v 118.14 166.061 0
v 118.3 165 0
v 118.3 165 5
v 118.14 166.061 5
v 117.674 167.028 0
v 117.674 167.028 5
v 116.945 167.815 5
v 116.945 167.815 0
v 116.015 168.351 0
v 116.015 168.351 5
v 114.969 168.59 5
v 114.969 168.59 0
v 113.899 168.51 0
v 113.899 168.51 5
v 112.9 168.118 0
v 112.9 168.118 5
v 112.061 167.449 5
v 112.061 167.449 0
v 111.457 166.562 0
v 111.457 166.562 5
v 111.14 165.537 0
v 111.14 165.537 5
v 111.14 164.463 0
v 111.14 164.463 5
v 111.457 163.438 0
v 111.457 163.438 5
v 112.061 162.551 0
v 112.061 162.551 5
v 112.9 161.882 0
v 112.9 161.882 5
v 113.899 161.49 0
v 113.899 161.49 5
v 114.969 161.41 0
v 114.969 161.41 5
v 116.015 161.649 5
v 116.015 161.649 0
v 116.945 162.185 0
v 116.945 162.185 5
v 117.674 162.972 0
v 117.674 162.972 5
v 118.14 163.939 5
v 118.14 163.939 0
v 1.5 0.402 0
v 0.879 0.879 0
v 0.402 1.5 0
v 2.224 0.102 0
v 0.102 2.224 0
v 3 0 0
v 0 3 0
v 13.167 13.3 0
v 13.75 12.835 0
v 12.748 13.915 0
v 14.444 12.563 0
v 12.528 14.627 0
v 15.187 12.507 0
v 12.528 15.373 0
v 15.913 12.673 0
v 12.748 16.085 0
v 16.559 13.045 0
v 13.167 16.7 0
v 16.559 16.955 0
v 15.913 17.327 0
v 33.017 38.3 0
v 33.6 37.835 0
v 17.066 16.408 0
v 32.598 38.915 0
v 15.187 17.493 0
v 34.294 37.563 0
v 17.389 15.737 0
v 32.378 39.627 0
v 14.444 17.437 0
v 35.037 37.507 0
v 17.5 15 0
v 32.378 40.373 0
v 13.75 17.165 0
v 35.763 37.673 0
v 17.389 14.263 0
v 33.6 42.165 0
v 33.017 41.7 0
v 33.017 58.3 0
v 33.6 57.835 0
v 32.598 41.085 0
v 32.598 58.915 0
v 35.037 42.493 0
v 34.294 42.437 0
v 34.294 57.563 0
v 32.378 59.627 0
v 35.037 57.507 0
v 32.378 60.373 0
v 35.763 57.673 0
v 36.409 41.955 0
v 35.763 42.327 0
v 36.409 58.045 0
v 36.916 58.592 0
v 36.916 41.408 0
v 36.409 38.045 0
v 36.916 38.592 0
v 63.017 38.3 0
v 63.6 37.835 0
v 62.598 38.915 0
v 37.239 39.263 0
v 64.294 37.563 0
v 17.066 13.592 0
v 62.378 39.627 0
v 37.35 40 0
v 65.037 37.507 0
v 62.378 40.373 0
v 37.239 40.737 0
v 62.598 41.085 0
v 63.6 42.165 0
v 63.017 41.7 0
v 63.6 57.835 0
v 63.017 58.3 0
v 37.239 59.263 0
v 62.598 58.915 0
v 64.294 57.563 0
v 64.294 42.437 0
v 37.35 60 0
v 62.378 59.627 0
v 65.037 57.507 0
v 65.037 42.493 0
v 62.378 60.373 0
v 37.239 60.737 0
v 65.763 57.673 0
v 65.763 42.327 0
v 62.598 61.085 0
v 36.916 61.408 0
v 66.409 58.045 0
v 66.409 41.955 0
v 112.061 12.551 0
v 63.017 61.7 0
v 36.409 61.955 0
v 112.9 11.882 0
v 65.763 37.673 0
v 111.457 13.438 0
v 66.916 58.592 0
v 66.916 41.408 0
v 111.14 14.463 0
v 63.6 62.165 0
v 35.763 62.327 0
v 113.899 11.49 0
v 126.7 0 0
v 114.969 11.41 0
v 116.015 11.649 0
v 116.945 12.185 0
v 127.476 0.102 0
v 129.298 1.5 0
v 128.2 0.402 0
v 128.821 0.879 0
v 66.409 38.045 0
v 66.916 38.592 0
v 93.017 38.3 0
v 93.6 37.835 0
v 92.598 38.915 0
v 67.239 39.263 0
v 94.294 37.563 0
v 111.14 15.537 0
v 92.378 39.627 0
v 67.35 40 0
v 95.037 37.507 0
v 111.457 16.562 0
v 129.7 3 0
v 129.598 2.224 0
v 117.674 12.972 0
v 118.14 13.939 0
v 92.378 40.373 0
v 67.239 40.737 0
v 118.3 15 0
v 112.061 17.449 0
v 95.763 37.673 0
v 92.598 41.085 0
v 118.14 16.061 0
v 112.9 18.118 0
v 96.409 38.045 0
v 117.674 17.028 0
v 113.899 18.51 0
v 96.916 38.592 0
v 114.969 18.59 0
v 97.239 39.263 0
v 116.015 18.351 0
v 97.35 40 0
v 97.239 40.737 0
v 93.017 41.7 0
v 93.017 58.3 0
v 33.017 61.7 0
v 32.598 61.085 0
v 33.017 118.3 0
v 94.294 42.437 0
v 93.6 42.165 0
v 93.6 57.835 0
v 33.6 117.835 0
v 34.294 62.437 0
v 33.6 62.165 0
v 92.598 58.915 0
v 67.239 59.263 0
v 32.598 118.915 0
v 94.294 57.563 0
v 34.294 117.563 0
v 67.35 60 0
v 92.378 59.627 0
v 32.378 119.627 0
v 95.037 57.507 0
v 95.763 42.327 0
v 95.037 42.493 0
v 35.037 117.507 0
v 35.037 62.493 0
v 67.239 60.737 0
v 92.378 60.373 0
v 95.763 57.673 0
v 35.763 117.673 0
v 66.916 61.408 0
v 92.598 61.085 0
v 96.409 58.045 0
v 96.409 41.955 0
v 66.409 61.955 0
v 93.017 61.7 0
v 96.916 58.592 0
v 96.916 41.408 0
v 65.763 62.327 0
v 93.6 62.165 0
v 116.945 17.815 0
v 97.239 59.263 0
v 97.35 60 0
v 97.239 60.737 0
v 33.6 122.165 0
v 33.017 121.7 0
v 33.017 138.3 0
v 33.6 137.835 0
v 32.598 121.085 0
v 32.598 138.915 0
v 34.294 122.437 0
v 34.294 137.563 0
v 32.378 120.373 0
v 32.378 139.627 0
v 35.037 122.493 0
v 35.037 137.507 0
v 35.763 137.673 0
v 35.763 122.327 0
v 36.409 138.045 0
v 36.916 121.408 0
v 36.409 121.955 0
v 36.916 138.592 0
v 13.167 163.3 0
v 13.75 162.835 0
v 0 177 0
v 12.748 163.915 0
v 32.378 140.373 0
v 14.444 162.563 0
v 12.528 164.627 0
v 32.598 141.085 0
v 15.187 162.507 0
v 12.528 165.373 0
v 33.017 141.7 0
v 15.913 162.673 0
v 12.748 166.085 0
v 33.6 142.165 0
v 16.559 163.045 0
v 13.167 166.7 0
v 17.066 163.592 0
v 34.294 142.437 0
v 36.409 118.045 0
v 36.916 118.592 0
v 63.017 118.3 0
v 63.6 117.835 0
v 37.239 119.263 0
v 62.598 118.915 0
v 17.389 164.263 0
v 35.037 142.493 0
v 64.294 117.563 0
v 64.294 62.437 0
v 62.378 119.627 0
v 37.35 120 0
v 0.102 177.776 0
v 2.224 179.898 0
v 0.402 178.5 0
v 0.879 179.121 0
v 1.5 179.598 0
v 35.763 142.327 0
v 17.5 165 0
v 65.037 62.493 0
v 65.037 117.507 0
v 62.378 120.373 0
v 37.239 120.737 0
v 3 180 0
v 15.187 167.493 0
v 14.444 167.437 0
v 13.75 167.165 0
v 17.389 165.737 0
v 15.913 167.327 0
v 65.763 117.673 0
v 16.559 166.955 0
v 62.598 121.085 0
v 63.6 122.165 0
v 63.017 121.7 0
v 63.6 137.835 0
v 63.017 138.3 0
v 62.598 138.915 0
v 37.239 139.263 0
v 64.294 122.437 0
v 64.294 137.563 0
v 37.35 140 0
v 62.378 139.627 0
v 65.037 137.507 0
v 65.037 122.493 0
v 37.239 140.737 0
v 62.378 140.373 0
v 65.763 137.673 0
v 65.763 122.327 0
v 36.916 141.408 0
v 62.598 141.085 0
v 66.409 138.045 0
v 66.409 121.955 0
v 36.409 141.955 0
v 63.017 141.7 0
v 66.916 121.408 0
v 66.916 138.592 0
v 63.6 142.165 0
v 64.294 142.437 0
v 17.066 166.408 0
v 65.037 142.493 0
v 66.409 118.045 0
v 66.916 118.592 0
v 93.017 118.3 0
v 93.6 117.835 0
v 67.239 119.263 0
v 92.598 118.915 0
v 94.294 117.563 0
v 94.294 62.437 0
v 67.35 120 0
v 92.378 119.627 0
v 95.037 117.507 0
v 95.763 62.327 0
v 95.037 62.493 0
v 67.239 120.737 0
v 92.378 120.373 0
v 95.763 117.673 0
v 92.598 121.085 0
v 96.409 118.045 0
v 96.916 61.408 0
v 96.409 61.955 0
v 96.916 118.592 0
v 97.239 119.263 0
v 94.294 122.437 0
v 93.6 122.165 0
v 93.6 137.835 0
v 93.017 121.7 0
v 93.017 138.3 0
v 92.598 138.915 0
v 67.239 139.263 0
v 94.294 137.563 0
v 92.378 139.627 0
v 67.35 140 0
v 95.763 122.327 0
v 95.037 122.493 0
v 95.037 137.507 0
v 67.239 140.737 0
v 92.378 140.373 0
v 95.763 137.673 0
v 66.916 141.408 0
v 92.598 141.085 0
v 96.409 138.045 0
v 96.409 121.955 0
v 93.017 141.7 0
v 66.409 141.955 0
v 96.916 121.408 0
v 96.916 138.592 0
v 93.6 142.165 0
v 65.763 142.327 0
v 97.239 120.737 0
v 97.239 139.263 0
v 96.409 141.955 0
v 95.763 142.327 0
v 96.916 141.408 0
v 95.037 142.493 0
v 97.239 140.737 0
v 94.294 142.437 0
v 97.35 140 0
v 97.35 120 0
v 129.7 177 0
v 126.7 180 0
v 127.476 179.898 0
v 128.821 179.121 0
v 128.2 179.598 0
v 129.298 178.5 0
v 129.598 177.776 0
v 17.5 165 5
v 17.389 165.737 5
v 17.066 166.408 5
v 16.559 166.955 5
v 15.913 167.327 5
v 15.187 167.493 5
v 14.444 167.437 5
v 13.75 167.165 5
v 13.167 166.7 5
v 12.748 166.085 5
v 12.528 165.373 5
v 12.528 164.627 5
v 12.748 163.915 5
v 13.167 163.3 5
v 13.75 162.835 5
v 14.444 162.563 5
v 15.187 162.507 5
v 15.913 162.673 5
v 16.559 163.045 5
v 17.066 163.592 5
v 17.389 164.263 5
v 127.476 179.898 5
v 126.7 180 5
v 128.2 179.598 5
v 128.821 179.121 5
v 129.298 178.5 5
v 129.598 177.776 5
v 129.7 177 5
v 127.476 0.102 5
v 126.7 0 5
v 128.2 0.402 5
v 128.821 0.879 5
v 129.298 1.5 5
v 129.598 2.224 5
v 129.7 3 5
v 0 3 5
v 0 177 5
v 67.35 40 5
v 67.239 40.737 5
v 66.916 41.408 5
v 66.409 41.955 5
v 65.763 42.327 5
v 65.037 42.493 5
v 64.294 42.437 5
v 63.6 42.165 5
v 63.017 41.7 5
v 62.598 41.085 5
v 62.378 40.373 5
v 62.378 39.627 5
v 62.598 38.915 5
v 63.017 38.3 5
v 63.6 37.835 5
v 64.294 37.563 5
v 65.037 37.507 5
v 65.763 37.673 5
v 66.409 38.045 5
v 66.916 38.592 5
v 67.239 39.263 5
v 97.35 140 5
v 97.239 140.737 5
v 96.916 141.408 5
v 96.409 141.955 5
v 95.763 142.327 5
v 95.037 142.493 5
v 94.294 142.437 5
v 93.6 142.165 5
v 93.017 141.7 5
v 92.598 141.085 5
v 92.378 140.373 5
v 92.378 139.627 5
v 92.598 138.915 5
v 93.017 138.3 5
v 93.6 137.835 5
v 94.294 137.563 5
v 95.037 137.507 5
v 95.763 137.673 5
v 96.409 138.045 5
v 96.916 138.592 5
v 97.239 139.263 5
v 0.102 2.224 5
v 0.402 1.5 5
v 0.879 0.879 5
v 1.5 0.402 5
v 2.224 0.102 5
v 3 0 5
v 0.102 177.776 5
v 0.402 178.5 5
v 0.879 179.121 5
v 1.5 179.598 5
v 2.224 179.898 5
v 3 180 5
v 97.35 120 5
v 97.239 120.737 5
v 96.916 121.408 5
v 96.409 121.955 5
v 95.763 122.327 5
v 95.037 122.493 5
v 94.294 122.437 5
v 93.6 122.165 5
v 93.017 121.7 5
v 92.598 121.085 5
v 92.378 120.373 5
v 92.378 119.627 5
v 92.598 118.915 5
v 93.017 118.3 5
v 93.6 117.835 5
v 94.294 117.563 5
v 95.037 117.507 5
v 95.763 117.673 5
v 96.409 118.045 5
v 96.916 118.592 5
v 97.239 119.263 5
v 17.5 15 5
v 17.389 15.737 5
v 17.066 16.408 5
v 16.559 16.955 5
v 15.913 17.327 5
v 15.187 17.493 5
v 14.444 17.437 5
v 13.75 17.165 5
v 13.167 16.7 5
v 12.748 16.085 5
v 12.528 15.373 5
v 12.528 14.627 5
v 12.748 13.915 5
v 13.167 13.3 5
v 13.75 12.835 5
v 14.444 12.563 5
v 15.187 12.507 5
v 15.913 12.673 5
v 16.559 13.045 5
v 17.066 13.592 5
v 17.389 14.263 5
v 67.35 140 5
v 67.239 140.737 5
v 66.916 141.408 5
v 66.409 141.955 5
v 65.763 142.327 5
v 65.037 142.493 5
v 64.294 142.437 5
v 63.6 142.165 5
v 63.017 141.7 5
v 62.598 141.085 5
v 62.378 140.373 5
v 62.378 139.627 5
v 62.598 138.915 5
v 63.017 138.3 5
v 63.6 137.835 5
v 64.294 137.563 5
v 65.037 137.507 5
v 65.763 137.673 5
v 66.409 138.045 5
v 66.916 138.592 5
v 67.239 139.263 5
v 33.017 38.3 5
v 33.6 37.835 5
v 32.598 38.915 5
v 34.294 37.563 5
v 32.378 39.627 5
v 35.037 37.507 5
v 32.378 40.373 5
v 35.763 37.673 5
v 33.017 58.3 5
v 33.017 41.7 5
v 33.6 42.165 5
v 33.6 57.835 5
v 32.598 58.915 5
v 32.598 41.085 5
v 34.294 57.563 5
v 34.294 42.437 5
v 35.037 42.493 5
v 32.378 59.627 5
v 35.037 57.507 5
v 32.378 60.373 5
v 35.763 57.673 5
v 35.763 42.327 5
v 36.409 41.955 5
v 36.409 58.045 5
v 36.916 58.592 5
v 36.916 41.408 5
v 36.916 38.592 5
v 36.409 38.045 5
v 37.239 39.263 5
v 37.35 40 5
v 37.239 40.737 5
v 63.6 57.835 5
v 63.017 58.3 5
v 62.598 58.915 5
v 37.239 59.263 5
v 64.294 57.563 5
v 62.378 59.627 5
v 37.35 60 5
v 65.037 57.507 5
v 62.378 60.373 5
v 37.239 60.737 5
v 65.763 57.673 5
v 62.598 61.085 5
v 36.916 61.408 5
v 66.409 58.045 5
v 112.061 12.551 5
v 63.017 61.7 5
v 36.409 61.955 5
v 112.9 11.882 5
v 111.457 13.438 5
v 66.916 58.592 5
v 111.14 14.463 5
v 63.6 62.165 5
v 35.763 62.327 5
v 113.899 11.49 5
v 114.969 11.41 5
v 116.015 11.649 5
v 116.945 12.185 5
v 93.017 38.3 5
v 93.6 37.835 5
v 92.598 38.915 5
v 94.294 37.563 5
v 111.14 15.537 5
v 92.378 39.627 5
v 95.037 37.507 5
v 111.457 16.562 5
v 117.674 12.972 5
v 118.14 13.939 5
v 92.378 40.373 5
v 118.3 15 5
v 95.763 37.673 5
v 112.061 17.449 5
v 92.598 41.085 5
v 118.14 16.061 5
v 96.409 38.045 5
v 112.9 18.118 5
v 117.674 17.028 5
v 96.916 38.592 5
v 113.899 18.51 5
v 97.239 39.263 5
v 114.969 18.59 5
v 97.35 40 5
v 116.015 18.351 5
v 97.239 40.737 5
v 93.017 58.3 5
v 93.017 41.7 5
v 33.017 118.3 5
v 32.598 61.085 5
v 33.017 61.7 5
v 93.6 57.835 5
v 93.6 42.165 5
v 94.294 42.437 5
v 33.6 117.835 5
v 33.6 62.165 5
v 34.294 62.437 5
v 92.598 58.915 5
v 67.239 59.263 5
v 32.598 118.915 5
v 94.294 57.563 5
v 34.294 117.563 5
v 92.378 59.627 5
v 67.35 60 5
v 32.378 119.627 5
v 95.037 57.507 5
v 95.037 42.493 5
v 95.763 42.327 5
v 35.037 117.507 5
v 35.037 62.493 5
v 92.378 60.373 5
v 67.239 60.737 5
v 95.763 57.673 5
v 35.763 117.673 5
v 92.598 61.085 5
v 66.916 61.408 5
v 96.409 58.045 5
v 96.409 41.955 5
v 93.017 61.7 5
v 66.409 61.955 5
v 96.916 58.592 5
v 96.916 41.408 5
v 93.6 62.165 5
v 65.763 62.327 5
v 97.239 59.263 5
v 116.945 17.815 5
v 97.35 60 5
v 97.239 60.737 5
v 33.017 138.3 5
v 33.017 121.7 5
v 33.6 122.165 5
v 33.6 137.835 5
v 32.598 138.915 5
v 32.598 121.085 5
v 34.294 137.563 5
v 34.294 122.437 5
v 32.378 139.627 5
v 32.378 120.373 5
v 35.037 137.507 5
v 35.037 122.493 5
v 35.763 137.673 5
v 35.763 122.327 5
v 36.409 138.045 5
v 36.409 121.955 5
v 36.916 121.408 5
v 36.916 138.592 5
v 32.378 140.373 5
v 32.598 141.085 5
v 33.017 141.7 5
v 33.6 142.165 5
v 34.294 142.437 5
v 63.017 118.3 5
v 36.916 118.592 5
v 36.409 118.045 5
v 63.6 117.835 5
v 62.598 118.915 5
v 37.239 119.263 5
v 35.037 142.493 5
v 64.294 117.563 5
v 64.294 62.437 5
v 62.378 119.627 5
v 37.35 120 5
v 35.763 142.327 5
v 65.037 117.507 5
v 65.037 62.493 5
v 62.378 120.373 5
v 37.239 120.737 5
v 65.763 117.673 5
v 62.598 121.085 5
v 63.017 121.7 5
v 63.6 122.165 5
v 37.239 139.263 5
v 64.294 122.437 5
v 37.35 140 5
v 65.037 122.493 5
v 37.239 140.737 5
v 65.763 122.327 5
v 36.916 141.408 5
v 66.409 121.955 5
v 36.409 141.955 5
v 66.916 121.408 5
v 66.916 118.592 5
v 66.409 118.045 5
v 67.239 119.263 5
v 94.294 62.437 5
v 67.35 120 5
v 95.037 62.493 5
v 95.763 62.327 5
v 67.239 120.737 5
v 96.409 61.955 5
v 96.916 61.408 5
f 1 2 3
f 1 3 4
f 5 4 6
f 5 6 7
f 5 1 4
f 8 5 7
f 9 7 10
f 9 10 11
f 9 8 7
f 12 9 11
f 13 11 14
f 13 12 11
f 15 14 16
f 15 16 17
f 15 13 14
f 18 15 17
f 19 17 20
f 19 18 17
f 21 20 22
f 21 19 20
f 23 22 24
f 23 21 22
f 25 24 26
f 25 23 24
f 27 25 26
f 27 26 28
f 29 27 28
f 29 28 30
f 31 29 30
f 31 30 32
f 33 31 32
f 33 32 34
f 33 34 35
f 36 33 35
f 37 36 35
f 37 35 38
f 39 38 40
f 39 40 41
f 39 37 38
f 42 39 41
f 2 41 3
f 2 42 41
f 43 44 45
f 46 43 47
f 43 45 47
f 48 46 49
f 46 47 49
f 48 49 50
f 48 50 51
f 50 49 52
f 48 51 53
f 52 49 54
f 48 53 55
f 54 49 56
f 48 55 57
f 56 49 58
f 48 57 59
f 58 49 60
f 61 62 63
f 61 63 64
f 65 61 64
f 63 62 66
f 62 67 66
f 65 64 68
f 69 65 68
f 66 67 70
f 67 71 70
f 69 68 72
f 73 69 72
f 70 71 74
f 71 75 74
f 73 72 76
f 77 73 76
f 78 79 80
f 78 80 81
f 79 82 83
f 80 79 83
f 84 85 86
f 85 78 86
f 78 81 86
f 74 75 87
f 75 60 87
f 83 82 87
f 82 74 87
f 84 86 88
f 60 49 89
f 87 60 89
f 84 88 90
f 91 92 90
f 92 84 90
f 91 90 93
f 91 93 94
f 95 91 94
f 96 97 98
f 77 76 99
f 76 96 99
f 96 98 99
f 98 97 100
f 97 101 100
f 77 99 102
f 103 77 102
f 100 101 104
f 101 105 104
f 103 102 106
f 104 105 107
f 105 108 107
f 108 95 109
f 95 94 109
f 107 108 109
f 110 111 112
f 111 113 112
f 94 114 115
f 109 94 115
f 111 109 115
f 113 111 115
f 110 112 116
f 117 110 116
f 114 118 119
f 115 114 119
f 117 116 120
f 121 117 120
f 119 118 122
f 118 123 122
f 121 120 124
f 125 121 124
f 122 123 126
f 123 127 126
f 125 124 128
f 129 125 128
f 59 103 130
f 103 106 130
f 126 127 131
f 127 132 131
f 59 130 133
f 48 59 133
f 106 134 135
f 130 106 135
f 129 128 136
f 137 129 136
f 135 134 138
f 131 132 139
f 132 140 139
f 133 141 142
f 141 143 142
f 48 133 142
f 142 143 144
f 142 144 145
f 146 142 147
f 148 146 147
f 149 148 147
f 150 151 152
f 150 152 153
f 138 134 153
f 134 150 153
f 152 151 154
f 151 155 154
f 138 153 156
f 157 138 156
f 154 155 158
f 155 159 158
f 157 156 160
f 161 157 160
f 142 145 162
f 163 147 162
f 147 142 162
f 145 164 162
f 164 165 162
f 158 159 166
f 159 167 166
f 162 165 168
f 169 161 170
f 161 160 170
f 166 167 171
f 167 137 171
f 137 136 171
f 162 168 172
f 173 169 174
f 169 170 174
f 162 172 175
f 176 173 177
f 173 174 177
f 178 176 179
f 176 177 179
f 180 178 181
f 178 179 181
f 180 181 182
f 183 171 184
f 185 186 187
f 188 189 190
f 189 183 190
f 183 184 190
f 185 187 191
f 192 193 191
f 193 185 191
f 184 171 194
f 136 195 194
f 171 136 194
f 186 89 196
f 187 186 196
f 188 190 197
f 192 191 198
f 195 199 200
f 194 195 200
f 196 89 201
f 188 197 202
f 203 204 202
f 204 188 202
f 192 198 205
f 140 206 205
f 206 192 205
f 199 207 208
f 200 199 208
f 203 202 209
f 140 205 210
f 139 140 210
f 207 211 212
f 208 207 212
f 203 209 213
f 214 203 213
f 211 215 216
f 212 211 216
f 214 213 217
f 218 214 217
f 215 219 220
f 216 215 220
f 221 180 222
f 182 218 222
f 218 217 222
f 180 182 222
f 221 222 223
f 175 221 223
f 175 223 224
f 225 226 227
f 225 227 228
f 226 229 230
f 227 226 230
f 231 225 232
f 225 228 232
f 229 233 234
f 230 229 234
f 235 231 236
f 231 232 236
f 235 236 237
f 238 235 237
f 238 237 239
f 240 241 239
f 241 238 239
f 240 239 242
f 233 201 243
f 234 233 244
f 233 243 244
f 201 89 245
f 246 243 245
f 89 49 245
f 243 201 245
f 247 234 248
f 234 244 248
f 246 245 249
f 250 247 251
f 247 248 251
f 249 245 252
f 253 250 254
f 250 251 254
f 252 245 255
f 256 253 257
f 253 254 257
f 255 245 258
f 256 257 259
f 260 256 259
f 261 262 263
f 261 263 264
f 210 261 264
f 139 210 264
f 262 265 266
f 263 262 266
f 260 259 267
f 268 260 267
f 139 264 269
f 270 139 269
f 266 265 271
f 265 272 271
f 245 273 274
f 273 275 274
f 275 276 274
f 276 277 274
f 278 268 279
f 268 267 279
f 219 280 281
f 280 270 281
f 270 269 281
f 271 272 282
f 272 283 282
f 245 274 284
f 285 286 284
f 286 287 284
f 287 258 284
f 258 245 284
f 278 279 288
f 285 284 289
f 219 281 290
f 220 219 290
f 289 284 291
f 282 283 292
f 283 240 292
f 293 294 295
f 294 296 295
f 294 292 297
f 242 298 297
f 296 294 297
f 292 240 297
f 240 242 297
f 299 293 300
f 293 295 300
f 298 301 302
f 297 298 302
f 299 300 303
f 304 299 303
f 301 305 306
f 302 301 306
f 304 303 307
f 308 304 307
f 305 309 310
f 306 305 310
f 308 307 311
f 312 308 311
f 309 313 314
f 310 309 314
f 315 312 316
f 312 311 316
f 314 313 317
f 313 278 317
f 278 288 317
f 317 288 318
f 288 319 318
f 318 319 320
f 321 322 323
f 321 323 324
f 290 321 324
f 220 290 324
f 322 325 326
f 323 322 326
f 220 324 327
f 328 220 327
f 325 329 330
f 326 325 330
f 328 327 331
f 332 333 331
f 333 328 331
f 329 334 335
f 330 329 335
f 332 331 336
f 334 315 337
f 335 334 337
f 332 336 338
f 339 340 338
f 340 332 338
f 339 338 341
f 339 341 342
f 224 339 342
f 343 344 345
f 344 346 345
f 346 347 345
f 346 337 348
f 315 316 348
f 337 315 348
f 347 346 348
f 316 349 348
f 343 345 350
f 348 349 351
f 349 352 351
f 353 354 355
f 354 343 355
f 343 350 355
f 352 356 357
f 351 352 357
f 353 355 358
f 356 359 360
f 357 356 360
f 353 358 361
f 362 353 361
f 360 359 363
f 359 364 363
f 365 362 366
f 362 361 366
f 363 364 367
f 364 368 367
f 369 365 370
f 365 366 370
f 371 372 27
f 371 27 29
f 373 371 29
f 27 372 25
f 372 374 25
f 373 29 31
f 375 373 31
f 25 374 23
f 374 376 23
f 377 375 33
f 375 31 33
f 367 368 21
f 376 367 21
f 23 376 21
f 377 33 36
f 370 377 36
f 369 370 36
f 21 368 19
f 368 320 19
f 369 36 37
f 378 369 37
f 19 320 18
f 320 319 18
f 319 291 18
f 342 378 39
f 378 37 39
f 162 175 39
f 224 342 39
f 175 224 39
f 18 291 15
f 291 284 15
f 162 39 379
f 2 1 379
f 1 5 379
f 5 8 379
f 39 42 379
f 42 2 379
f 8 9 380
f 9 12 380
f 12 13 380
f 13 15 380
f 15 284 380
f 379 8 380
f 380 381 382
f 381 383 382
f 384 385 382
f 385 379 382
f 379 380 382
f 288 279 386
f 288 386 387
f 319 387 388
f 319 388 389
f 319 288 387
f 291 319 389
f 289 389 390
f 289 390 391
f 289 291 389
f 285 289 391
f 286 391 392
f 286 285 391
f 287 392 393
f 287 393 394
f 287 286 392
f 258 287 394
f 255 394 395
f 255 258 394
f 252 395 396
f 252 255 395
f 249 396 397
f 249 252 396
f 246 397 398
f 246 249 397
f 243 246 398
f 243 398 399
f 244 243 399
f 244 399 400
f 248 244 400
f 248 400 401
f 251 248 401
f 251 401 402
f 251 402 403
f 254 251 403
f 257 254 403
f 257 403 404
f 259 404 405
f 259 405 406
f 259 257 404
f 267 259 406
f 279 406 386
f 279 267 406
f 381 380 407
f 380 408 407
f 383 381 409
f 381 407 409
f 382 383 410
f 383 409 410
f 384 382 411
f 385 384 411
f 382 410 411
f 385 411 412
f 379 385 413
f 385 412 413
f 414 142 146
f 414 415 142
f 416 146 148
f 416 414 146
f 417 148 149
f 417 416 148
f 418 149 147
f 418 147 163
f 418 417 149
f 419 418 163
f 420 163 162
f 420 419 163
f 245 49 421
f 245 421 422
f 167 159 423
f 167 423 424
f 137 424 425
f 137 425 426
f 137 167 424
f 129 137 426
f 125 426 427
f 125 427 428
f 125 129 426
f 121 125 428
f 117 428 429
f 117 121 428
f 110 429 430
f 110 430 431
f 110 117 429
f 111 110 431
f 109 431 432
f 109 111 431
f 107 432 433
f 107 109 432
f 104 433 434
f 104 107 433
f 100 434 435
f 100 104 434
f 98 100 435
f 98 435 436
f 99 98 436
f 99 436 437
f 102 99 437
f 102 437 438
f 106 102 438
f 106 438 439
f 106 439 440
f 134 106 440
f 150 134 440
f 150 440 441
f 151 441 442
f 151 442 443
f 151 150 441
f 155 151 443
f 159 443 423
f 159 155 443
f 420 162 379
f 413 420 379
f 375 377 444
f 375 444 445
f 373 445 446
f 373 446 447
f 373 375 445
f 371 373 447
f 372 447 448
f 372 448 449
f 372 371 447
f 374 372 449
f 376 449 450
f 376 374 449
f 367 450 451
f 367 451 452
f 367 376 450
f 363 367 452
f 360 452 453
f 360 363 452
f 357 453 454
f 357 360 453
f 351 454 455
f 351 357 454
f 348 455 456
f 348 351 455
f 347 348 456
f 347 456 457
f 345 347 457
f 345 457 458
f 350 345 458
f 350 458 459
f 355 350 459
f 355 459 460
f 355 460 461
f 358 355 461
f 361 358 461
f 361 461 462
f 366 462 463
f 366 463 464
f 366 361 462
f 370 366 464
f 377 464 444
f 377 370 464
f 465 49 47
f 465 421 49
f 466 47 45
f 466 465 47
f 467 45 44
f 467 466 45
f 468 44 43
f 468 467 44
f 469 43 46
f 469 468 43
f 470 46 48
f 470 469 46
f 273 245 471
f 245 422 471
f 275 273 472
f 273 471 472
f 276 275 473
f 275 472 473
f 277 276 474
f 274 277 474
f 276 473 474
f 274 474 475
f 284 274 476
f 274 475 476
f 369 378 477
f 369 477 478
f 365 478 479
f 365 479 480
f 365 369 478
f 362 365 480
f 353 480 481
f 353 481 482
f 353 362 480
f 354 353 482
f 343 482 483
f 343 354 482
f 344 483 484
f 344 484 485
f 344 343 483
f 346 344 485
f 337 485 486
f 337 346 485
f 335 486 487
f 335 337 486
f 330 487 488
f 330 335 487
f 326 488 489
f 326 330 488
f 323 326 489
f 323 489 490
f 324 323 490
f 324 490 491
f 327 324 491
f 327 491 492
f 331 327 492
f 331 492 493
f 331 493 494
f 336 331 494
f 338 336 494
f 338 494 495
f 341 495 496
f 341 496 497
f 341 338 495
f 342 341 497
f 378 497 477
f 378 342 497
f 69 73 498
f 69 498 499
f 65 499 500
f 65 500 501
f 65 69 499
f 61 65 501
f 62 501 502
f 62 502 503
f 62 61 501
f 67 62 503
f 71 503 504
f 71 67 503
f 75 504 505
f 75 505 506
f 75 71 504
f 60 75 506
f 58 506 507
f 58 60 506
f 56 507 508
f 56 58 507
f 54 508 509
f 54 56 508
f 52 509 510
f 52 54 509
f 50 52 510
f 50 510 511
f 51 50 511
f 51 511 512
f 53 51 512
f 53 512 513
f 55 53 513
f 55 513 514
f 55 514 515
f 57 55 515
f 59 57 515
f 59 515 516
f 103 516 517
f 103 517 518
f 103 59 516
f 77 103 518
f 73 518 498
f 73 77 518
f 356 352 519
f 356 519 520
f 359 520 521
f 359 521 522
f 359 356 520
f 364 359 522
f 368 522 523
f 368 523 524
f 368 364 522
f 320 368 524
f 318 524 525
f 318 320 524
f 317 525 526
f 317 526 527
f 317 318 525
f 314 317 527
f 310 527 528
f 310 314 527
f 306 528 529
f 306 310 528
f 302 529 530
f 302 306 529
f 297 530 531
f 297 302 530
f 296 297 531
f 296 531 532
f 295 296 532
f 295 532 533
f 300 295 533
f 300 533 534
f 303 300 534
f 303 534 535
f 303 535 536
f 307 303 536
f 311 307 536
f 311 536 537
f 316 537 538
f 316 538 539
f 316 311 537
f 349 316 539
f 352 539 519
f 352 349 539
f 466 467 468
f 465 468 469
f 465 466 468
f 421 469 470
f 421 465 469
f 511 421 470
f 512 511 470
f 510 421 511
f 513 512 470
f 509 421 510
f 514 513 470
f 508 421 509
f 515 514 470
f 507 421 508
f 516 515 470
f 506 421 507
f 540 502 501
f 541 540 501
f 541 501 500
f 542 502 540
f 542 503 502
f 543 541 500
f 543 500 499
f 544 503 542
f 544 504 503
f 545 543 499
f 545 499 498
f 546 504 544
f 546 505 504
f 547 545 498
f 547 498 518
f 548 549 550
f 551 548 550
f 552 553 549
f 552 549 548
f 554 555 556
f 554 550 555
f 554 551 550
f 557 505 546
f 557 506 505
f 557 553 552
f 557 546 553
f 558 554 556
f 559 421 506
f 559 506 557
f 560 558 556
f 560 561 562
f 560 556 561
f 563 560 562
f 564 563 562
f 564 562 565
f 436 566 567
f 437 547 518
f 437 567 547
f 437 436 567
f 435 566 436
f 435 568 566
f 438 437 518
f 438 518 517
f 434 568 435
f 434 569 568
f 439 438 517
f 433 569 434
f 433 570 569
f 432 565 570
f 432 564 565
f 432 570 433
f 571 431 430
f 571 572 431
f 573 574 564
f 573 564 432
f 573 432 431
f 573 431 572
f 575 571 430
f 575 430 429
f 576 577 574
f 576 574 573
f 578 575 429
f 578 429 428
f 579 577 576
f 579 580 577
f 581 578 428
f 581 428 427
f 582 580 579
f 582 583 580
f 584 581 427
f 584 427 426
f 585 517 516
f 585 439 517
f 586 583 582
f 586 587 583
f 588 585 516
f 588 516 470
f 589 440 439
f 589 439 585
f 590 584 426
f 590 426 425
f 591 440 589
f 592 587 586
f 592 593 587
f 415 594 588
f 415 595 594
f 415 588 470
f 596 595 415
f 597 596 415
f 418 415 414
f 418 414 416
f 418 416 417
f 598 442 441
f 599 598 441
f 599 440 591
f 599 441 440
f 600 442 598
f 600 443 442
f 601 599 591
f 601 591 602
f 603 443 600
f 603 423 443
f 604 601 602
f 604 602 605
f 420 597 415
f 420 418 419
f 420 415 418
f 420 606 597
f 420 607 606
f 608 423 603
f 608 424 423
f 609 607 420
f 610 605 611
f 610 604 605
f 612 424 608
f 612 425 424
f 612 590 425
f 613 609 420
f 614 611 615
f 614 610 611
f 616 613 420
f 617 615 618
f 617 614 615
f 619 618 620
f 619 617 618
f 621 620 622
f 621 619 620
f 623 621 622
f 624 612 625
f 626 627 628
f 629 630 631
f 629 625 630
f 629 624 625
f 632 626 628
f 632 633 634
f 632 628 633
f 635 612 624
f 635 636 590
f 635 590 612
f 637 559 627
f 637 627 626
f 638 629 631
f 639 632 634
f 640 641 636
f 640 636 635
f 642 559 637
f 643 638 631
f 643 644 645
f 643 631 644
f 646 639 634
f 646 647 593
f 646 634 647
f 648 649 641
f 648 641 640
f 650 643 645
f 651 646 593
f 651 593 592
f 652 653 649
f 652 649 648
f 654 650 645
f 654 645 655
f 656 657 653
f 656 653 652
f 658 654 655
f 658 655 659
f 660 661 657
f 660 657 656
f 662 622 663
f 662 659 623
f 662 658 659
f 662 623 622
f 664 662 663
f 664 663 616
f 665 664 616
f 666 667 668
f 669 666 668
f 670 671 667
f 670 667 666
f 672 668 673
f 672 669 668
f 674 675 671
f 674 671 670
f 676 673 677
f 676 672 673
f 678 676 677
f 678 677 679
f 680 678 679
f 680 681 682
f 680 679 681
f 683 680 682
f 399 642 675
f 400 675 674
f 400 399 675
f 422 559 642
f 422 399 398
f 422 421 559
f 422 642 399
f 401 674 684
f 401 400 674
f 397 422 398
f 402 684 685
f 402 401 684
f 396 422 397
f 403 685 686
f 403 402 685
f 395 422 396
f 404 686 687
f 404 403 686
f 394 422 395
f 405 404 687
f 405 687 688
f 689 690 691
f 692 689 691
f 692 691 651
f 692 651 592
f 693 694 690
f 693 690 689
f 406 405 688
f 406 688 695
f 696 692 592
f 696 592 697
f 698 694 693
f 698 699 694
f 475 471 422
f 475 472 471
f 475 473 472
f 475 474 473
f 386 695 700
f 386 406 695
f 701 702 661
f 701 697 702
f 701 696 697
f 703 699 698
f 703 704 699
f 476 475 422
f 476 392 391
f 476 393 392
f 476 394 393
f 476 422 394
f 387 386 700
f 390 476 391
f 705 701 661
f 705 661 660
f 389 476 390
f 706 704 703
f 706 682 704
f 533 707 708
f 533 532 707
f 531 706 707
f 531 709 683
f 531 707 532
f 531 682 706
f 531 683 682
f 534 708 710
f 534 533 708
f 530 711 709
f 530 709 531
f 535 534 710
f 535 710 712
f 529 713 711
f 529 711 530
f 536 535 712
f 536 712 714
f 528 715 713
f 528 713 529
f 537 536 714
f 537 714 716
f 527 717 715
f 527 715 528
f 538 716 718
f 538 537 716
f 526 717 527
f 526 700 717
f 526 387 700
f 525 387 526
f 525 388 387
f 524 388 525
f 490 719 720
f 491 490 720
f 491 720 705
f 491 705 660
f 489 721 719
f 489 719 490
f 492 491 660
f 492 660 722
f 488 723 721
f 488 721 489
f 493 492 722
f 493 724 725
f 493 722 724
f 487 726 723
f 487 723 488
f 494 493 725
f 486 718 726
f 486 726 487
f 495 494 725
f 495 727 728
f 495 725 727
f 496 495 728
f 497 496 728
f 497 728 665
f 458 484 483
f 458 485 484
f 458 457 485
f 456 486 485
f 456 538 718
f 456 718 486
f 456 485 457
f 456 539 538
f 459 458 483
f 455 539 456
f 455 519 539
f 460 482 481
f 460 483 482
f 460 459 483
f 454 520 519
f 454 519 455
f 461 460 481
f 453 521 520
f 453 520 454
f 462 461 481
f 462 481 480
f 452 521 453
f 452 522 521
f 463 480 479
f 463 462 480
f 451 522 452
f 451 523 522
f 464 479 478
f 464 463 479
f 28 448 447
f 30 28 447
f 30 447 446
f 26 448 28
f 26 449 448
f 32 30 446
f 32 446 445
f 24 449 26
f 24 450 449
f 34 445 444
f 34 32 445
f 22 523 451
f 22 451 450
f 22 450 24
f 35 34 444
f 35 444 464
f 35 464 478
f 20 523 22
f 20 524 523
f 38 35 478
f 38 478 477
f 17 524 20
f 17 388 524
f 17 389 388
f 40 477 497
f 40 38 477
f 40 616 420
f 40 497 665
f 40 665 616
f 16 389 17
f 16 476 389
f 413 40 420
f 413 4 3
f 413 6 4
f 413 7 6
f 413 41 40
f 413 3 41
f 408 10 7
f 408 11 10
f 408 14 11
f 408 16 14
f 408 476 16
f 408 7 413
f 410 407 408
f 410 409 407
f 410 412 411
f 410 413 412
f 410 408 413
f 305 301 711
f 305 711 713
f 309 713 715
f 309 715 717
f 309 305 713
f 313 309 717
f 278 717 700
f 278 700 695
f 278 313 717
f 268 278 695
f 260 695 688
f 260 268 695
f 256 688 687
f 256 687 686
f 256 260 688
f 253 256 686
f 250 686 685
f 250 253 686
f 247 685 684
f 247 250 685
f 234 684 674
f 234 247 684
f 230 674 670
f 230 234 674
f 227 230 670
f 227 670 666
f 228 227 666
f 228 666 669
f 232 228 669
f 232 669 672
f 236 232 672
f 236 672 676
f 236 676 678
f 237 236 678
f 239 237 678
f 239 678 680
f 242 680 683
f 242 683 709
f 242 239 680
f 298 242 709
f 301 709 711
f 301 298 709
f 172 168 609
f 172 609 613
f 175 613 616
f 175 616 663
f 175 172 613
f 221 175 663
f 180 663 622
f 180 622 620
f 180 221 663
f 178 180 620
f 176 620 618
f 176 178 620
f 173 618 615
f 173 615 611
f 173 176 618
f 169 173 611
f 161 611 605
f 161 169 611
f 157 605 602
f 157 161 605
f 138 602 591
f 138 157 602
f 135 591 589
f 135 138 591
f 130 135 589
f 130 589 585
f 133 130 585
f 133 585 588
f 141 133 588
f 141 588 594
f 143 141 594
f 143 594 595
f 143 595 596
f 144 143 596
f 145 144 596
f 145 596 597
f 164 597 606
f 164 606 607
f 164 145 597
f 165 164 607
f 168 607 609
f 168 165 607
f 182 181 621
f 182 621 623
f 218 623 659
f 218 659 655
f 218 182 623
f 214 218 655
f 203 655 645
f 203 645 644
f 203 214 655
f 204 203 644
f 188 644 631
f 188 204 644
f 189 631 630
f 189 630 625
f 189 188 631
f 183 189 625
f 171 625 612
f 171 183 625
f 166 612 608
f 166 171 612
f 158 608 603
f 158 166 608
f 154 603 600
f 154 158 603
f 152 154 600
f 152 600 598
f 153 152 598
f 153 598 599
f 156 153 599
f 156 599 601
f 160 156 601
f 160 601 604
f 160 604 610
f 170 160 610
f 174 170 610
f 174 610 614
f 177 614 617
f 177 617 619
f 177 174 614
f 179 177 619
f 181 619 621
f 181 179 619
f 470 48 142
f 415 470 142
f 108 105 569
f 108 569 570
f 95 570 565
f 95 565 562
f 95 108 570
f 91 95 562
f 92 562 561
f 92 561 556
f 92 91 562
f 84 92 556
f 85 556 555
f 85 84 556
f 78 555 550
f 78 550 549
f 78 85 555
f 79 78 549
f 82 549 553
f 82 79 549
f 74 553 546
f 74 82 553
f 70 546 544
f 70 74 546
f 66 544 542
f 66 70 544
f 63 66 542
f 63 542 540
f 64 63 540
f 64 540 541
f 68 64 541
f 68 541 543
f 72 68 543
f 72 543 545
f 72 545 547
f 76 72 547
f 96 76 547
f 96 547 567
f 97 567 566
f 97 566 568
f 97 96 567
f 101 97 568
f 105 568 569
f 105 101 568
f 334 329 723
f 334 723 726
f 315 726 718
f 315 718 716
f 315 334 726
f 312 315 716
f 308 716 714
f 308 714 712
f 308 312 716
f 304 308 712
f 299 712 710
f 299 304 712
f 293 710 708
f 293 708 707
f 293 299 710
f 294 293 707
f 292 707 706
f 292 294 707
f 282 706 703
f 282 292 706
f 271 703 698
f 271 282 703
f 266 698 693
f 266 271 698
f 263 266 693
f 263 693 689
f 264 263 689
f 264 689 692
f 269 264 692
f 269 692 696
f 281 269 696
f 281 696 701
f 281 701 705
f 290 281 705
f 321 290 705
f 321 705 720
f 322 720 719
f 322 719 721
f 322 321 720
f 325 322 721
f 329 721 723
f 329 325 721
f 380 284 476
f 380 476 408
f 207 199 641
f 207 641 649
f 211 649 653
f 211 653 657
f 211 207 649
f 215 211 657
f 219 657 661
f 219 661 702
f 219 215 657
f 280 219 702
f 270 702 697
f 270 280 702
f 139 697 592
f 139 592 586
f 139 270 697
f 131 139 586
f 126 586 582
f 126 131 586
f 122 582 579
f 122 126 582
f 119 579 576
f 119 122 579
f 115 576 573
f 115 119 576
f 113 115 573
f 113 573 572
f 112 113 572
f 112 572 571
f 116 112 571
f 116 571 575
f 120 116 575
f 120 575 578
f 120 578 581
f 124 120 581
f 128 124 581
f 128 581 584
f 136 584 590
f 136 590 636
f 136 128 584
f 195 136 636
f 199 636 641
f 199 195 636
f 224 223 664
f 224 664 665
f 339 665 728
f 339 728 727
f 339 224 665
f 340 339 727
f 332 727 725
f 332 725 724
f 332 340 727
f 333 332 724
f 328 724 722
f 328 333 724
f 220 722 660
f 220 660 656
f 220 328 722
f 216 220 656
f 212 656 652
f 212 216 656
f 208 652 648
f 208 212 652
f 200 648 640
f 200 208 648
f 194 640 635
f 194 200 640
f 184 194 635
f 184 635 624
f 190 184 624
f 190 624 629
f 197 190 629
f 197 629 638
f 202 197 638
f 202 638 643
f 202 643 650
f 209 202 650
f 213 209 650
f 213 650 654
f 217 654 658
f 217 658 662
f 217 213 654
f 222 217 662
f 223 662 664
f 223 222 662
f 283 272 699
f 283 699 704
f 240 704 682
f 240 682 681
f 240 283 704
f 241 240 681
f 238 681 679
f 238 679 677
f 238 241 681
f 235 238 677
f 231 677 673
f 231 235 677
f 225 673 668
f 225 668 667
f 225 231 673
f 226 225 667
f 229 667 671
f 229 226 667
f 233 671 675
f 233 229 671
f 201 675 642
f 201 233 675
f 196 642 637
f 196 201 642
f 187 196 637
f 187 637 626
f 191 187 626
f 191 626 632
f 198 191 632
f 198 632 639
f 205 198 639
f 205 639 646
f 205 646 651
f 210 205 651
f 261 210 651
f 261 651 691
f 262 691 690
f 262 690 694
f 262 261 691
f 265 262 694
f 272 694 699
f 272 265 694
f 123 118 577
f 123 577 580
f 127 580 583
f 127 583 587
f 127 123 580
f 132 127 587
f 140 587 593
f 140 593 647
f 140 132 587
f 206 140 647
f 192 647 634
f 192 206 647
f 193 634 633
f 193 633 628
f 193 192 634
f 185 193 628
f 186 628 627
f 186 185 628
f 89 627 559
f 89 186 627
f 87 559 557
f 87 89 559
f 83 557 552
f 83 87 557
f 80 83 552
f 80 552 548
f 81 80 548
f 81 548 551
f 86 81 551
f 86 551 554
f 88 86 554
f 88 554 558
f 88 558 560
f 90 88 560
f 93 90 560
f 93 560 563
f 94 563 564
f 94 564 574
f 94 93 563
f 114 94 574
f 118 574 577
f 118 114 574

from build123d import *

# Parameters (mm, degrees)
SKETCH1_W           = 129.7
SKETCH1_H           = 180
SKETCH1_R           = 2.5
SKETCH1_R_2         = 3.6
BOSS_EXTRUDE1_DEPTH = 5
FILLET1_R           = 3


with BuildPart() as part:
    # Sketch1 → Boss-Extrude1 (new body)
    with BuildSketch(Plane.XY):
        with Locations((64.85, 90)):
            Rectangle(SKETCH1_W, SKETCH1_H)
        with Locations((15, 15)):
            Circle(SKETCH1_R, mode=Mode.SUBTRACT)
        with Locations((15, 165)):
            Circle(SKETCH1_R, mode=Mode.SUBTRACT)
        with Locations((114.7, 165)):
            Circle(SKETCH1_R_2, mode=Mode.SUBTRACT)
        with Locations((114.7, 15)):
            Circle(SKETCH1_R_2, mode=Mode.SUBTRACT)
        with Locations((34.85, 140)):
            Circle(SKETCH1_R, mode=Mode.SUBTRACT)
        with Locations((64.85, 140)):
            Circle(SKETCH1_R, mode=Mode.SUBTRACT)
        with Locations((94.85, 140)):
            Circle(SKETCH1_R, mode=Mode.SUBTRACT)
        with Locations((34.85, 40)):
            Circle(SKETCH1_R, mode=Mode.SUBTRACT)
        with Locations((64.85, 40)):
            Circle(SKETCH1_R, mode=Mode.SUBTRACT)
        with Locations((94.85, 40)):
            Circle(SKETCH1_R, mode=Mode.SUBTRACT)
        with Locations((94.85, 120)):
            Circle(SKETCH1_R, mode=Mode.SUBTRACT)
        with Locations((64.85, 120)):
            Circle(SKETCH1_R, mode=Mode.SUBTRACT)
        with Locations((34.85, 120)):
            Circle(SKETCH1_R, mode=Mode.SUBTRACT)
        with Locations((34.85, 60)):
            Circle(SKETCH1_R, mode=Mode.SUBTRACT)
        with Locations((64.85, 60)):
            Circle(SKETCH1_R, mode=Mode.SUBTRACT)
        with Locations((94.85, 60)):
            Circle(SKETCH1_R, mode=Mode.SUBTRACT)
    extrude(amount=BOSS_EXTRUDE1_DEPTH)

    # Fillet1
    fillet1_edges = [part.edges().sort_by_distance(p)[0] for p in [
        (0, 180, 2.5),
        (129.7, 180, 2.5),
        (129.7, 0, 2.5),
        (0, 0, 2.5),
    ]]
    fillet(fillet1_edges, radius=FILLET1_R)


solid = part.part
